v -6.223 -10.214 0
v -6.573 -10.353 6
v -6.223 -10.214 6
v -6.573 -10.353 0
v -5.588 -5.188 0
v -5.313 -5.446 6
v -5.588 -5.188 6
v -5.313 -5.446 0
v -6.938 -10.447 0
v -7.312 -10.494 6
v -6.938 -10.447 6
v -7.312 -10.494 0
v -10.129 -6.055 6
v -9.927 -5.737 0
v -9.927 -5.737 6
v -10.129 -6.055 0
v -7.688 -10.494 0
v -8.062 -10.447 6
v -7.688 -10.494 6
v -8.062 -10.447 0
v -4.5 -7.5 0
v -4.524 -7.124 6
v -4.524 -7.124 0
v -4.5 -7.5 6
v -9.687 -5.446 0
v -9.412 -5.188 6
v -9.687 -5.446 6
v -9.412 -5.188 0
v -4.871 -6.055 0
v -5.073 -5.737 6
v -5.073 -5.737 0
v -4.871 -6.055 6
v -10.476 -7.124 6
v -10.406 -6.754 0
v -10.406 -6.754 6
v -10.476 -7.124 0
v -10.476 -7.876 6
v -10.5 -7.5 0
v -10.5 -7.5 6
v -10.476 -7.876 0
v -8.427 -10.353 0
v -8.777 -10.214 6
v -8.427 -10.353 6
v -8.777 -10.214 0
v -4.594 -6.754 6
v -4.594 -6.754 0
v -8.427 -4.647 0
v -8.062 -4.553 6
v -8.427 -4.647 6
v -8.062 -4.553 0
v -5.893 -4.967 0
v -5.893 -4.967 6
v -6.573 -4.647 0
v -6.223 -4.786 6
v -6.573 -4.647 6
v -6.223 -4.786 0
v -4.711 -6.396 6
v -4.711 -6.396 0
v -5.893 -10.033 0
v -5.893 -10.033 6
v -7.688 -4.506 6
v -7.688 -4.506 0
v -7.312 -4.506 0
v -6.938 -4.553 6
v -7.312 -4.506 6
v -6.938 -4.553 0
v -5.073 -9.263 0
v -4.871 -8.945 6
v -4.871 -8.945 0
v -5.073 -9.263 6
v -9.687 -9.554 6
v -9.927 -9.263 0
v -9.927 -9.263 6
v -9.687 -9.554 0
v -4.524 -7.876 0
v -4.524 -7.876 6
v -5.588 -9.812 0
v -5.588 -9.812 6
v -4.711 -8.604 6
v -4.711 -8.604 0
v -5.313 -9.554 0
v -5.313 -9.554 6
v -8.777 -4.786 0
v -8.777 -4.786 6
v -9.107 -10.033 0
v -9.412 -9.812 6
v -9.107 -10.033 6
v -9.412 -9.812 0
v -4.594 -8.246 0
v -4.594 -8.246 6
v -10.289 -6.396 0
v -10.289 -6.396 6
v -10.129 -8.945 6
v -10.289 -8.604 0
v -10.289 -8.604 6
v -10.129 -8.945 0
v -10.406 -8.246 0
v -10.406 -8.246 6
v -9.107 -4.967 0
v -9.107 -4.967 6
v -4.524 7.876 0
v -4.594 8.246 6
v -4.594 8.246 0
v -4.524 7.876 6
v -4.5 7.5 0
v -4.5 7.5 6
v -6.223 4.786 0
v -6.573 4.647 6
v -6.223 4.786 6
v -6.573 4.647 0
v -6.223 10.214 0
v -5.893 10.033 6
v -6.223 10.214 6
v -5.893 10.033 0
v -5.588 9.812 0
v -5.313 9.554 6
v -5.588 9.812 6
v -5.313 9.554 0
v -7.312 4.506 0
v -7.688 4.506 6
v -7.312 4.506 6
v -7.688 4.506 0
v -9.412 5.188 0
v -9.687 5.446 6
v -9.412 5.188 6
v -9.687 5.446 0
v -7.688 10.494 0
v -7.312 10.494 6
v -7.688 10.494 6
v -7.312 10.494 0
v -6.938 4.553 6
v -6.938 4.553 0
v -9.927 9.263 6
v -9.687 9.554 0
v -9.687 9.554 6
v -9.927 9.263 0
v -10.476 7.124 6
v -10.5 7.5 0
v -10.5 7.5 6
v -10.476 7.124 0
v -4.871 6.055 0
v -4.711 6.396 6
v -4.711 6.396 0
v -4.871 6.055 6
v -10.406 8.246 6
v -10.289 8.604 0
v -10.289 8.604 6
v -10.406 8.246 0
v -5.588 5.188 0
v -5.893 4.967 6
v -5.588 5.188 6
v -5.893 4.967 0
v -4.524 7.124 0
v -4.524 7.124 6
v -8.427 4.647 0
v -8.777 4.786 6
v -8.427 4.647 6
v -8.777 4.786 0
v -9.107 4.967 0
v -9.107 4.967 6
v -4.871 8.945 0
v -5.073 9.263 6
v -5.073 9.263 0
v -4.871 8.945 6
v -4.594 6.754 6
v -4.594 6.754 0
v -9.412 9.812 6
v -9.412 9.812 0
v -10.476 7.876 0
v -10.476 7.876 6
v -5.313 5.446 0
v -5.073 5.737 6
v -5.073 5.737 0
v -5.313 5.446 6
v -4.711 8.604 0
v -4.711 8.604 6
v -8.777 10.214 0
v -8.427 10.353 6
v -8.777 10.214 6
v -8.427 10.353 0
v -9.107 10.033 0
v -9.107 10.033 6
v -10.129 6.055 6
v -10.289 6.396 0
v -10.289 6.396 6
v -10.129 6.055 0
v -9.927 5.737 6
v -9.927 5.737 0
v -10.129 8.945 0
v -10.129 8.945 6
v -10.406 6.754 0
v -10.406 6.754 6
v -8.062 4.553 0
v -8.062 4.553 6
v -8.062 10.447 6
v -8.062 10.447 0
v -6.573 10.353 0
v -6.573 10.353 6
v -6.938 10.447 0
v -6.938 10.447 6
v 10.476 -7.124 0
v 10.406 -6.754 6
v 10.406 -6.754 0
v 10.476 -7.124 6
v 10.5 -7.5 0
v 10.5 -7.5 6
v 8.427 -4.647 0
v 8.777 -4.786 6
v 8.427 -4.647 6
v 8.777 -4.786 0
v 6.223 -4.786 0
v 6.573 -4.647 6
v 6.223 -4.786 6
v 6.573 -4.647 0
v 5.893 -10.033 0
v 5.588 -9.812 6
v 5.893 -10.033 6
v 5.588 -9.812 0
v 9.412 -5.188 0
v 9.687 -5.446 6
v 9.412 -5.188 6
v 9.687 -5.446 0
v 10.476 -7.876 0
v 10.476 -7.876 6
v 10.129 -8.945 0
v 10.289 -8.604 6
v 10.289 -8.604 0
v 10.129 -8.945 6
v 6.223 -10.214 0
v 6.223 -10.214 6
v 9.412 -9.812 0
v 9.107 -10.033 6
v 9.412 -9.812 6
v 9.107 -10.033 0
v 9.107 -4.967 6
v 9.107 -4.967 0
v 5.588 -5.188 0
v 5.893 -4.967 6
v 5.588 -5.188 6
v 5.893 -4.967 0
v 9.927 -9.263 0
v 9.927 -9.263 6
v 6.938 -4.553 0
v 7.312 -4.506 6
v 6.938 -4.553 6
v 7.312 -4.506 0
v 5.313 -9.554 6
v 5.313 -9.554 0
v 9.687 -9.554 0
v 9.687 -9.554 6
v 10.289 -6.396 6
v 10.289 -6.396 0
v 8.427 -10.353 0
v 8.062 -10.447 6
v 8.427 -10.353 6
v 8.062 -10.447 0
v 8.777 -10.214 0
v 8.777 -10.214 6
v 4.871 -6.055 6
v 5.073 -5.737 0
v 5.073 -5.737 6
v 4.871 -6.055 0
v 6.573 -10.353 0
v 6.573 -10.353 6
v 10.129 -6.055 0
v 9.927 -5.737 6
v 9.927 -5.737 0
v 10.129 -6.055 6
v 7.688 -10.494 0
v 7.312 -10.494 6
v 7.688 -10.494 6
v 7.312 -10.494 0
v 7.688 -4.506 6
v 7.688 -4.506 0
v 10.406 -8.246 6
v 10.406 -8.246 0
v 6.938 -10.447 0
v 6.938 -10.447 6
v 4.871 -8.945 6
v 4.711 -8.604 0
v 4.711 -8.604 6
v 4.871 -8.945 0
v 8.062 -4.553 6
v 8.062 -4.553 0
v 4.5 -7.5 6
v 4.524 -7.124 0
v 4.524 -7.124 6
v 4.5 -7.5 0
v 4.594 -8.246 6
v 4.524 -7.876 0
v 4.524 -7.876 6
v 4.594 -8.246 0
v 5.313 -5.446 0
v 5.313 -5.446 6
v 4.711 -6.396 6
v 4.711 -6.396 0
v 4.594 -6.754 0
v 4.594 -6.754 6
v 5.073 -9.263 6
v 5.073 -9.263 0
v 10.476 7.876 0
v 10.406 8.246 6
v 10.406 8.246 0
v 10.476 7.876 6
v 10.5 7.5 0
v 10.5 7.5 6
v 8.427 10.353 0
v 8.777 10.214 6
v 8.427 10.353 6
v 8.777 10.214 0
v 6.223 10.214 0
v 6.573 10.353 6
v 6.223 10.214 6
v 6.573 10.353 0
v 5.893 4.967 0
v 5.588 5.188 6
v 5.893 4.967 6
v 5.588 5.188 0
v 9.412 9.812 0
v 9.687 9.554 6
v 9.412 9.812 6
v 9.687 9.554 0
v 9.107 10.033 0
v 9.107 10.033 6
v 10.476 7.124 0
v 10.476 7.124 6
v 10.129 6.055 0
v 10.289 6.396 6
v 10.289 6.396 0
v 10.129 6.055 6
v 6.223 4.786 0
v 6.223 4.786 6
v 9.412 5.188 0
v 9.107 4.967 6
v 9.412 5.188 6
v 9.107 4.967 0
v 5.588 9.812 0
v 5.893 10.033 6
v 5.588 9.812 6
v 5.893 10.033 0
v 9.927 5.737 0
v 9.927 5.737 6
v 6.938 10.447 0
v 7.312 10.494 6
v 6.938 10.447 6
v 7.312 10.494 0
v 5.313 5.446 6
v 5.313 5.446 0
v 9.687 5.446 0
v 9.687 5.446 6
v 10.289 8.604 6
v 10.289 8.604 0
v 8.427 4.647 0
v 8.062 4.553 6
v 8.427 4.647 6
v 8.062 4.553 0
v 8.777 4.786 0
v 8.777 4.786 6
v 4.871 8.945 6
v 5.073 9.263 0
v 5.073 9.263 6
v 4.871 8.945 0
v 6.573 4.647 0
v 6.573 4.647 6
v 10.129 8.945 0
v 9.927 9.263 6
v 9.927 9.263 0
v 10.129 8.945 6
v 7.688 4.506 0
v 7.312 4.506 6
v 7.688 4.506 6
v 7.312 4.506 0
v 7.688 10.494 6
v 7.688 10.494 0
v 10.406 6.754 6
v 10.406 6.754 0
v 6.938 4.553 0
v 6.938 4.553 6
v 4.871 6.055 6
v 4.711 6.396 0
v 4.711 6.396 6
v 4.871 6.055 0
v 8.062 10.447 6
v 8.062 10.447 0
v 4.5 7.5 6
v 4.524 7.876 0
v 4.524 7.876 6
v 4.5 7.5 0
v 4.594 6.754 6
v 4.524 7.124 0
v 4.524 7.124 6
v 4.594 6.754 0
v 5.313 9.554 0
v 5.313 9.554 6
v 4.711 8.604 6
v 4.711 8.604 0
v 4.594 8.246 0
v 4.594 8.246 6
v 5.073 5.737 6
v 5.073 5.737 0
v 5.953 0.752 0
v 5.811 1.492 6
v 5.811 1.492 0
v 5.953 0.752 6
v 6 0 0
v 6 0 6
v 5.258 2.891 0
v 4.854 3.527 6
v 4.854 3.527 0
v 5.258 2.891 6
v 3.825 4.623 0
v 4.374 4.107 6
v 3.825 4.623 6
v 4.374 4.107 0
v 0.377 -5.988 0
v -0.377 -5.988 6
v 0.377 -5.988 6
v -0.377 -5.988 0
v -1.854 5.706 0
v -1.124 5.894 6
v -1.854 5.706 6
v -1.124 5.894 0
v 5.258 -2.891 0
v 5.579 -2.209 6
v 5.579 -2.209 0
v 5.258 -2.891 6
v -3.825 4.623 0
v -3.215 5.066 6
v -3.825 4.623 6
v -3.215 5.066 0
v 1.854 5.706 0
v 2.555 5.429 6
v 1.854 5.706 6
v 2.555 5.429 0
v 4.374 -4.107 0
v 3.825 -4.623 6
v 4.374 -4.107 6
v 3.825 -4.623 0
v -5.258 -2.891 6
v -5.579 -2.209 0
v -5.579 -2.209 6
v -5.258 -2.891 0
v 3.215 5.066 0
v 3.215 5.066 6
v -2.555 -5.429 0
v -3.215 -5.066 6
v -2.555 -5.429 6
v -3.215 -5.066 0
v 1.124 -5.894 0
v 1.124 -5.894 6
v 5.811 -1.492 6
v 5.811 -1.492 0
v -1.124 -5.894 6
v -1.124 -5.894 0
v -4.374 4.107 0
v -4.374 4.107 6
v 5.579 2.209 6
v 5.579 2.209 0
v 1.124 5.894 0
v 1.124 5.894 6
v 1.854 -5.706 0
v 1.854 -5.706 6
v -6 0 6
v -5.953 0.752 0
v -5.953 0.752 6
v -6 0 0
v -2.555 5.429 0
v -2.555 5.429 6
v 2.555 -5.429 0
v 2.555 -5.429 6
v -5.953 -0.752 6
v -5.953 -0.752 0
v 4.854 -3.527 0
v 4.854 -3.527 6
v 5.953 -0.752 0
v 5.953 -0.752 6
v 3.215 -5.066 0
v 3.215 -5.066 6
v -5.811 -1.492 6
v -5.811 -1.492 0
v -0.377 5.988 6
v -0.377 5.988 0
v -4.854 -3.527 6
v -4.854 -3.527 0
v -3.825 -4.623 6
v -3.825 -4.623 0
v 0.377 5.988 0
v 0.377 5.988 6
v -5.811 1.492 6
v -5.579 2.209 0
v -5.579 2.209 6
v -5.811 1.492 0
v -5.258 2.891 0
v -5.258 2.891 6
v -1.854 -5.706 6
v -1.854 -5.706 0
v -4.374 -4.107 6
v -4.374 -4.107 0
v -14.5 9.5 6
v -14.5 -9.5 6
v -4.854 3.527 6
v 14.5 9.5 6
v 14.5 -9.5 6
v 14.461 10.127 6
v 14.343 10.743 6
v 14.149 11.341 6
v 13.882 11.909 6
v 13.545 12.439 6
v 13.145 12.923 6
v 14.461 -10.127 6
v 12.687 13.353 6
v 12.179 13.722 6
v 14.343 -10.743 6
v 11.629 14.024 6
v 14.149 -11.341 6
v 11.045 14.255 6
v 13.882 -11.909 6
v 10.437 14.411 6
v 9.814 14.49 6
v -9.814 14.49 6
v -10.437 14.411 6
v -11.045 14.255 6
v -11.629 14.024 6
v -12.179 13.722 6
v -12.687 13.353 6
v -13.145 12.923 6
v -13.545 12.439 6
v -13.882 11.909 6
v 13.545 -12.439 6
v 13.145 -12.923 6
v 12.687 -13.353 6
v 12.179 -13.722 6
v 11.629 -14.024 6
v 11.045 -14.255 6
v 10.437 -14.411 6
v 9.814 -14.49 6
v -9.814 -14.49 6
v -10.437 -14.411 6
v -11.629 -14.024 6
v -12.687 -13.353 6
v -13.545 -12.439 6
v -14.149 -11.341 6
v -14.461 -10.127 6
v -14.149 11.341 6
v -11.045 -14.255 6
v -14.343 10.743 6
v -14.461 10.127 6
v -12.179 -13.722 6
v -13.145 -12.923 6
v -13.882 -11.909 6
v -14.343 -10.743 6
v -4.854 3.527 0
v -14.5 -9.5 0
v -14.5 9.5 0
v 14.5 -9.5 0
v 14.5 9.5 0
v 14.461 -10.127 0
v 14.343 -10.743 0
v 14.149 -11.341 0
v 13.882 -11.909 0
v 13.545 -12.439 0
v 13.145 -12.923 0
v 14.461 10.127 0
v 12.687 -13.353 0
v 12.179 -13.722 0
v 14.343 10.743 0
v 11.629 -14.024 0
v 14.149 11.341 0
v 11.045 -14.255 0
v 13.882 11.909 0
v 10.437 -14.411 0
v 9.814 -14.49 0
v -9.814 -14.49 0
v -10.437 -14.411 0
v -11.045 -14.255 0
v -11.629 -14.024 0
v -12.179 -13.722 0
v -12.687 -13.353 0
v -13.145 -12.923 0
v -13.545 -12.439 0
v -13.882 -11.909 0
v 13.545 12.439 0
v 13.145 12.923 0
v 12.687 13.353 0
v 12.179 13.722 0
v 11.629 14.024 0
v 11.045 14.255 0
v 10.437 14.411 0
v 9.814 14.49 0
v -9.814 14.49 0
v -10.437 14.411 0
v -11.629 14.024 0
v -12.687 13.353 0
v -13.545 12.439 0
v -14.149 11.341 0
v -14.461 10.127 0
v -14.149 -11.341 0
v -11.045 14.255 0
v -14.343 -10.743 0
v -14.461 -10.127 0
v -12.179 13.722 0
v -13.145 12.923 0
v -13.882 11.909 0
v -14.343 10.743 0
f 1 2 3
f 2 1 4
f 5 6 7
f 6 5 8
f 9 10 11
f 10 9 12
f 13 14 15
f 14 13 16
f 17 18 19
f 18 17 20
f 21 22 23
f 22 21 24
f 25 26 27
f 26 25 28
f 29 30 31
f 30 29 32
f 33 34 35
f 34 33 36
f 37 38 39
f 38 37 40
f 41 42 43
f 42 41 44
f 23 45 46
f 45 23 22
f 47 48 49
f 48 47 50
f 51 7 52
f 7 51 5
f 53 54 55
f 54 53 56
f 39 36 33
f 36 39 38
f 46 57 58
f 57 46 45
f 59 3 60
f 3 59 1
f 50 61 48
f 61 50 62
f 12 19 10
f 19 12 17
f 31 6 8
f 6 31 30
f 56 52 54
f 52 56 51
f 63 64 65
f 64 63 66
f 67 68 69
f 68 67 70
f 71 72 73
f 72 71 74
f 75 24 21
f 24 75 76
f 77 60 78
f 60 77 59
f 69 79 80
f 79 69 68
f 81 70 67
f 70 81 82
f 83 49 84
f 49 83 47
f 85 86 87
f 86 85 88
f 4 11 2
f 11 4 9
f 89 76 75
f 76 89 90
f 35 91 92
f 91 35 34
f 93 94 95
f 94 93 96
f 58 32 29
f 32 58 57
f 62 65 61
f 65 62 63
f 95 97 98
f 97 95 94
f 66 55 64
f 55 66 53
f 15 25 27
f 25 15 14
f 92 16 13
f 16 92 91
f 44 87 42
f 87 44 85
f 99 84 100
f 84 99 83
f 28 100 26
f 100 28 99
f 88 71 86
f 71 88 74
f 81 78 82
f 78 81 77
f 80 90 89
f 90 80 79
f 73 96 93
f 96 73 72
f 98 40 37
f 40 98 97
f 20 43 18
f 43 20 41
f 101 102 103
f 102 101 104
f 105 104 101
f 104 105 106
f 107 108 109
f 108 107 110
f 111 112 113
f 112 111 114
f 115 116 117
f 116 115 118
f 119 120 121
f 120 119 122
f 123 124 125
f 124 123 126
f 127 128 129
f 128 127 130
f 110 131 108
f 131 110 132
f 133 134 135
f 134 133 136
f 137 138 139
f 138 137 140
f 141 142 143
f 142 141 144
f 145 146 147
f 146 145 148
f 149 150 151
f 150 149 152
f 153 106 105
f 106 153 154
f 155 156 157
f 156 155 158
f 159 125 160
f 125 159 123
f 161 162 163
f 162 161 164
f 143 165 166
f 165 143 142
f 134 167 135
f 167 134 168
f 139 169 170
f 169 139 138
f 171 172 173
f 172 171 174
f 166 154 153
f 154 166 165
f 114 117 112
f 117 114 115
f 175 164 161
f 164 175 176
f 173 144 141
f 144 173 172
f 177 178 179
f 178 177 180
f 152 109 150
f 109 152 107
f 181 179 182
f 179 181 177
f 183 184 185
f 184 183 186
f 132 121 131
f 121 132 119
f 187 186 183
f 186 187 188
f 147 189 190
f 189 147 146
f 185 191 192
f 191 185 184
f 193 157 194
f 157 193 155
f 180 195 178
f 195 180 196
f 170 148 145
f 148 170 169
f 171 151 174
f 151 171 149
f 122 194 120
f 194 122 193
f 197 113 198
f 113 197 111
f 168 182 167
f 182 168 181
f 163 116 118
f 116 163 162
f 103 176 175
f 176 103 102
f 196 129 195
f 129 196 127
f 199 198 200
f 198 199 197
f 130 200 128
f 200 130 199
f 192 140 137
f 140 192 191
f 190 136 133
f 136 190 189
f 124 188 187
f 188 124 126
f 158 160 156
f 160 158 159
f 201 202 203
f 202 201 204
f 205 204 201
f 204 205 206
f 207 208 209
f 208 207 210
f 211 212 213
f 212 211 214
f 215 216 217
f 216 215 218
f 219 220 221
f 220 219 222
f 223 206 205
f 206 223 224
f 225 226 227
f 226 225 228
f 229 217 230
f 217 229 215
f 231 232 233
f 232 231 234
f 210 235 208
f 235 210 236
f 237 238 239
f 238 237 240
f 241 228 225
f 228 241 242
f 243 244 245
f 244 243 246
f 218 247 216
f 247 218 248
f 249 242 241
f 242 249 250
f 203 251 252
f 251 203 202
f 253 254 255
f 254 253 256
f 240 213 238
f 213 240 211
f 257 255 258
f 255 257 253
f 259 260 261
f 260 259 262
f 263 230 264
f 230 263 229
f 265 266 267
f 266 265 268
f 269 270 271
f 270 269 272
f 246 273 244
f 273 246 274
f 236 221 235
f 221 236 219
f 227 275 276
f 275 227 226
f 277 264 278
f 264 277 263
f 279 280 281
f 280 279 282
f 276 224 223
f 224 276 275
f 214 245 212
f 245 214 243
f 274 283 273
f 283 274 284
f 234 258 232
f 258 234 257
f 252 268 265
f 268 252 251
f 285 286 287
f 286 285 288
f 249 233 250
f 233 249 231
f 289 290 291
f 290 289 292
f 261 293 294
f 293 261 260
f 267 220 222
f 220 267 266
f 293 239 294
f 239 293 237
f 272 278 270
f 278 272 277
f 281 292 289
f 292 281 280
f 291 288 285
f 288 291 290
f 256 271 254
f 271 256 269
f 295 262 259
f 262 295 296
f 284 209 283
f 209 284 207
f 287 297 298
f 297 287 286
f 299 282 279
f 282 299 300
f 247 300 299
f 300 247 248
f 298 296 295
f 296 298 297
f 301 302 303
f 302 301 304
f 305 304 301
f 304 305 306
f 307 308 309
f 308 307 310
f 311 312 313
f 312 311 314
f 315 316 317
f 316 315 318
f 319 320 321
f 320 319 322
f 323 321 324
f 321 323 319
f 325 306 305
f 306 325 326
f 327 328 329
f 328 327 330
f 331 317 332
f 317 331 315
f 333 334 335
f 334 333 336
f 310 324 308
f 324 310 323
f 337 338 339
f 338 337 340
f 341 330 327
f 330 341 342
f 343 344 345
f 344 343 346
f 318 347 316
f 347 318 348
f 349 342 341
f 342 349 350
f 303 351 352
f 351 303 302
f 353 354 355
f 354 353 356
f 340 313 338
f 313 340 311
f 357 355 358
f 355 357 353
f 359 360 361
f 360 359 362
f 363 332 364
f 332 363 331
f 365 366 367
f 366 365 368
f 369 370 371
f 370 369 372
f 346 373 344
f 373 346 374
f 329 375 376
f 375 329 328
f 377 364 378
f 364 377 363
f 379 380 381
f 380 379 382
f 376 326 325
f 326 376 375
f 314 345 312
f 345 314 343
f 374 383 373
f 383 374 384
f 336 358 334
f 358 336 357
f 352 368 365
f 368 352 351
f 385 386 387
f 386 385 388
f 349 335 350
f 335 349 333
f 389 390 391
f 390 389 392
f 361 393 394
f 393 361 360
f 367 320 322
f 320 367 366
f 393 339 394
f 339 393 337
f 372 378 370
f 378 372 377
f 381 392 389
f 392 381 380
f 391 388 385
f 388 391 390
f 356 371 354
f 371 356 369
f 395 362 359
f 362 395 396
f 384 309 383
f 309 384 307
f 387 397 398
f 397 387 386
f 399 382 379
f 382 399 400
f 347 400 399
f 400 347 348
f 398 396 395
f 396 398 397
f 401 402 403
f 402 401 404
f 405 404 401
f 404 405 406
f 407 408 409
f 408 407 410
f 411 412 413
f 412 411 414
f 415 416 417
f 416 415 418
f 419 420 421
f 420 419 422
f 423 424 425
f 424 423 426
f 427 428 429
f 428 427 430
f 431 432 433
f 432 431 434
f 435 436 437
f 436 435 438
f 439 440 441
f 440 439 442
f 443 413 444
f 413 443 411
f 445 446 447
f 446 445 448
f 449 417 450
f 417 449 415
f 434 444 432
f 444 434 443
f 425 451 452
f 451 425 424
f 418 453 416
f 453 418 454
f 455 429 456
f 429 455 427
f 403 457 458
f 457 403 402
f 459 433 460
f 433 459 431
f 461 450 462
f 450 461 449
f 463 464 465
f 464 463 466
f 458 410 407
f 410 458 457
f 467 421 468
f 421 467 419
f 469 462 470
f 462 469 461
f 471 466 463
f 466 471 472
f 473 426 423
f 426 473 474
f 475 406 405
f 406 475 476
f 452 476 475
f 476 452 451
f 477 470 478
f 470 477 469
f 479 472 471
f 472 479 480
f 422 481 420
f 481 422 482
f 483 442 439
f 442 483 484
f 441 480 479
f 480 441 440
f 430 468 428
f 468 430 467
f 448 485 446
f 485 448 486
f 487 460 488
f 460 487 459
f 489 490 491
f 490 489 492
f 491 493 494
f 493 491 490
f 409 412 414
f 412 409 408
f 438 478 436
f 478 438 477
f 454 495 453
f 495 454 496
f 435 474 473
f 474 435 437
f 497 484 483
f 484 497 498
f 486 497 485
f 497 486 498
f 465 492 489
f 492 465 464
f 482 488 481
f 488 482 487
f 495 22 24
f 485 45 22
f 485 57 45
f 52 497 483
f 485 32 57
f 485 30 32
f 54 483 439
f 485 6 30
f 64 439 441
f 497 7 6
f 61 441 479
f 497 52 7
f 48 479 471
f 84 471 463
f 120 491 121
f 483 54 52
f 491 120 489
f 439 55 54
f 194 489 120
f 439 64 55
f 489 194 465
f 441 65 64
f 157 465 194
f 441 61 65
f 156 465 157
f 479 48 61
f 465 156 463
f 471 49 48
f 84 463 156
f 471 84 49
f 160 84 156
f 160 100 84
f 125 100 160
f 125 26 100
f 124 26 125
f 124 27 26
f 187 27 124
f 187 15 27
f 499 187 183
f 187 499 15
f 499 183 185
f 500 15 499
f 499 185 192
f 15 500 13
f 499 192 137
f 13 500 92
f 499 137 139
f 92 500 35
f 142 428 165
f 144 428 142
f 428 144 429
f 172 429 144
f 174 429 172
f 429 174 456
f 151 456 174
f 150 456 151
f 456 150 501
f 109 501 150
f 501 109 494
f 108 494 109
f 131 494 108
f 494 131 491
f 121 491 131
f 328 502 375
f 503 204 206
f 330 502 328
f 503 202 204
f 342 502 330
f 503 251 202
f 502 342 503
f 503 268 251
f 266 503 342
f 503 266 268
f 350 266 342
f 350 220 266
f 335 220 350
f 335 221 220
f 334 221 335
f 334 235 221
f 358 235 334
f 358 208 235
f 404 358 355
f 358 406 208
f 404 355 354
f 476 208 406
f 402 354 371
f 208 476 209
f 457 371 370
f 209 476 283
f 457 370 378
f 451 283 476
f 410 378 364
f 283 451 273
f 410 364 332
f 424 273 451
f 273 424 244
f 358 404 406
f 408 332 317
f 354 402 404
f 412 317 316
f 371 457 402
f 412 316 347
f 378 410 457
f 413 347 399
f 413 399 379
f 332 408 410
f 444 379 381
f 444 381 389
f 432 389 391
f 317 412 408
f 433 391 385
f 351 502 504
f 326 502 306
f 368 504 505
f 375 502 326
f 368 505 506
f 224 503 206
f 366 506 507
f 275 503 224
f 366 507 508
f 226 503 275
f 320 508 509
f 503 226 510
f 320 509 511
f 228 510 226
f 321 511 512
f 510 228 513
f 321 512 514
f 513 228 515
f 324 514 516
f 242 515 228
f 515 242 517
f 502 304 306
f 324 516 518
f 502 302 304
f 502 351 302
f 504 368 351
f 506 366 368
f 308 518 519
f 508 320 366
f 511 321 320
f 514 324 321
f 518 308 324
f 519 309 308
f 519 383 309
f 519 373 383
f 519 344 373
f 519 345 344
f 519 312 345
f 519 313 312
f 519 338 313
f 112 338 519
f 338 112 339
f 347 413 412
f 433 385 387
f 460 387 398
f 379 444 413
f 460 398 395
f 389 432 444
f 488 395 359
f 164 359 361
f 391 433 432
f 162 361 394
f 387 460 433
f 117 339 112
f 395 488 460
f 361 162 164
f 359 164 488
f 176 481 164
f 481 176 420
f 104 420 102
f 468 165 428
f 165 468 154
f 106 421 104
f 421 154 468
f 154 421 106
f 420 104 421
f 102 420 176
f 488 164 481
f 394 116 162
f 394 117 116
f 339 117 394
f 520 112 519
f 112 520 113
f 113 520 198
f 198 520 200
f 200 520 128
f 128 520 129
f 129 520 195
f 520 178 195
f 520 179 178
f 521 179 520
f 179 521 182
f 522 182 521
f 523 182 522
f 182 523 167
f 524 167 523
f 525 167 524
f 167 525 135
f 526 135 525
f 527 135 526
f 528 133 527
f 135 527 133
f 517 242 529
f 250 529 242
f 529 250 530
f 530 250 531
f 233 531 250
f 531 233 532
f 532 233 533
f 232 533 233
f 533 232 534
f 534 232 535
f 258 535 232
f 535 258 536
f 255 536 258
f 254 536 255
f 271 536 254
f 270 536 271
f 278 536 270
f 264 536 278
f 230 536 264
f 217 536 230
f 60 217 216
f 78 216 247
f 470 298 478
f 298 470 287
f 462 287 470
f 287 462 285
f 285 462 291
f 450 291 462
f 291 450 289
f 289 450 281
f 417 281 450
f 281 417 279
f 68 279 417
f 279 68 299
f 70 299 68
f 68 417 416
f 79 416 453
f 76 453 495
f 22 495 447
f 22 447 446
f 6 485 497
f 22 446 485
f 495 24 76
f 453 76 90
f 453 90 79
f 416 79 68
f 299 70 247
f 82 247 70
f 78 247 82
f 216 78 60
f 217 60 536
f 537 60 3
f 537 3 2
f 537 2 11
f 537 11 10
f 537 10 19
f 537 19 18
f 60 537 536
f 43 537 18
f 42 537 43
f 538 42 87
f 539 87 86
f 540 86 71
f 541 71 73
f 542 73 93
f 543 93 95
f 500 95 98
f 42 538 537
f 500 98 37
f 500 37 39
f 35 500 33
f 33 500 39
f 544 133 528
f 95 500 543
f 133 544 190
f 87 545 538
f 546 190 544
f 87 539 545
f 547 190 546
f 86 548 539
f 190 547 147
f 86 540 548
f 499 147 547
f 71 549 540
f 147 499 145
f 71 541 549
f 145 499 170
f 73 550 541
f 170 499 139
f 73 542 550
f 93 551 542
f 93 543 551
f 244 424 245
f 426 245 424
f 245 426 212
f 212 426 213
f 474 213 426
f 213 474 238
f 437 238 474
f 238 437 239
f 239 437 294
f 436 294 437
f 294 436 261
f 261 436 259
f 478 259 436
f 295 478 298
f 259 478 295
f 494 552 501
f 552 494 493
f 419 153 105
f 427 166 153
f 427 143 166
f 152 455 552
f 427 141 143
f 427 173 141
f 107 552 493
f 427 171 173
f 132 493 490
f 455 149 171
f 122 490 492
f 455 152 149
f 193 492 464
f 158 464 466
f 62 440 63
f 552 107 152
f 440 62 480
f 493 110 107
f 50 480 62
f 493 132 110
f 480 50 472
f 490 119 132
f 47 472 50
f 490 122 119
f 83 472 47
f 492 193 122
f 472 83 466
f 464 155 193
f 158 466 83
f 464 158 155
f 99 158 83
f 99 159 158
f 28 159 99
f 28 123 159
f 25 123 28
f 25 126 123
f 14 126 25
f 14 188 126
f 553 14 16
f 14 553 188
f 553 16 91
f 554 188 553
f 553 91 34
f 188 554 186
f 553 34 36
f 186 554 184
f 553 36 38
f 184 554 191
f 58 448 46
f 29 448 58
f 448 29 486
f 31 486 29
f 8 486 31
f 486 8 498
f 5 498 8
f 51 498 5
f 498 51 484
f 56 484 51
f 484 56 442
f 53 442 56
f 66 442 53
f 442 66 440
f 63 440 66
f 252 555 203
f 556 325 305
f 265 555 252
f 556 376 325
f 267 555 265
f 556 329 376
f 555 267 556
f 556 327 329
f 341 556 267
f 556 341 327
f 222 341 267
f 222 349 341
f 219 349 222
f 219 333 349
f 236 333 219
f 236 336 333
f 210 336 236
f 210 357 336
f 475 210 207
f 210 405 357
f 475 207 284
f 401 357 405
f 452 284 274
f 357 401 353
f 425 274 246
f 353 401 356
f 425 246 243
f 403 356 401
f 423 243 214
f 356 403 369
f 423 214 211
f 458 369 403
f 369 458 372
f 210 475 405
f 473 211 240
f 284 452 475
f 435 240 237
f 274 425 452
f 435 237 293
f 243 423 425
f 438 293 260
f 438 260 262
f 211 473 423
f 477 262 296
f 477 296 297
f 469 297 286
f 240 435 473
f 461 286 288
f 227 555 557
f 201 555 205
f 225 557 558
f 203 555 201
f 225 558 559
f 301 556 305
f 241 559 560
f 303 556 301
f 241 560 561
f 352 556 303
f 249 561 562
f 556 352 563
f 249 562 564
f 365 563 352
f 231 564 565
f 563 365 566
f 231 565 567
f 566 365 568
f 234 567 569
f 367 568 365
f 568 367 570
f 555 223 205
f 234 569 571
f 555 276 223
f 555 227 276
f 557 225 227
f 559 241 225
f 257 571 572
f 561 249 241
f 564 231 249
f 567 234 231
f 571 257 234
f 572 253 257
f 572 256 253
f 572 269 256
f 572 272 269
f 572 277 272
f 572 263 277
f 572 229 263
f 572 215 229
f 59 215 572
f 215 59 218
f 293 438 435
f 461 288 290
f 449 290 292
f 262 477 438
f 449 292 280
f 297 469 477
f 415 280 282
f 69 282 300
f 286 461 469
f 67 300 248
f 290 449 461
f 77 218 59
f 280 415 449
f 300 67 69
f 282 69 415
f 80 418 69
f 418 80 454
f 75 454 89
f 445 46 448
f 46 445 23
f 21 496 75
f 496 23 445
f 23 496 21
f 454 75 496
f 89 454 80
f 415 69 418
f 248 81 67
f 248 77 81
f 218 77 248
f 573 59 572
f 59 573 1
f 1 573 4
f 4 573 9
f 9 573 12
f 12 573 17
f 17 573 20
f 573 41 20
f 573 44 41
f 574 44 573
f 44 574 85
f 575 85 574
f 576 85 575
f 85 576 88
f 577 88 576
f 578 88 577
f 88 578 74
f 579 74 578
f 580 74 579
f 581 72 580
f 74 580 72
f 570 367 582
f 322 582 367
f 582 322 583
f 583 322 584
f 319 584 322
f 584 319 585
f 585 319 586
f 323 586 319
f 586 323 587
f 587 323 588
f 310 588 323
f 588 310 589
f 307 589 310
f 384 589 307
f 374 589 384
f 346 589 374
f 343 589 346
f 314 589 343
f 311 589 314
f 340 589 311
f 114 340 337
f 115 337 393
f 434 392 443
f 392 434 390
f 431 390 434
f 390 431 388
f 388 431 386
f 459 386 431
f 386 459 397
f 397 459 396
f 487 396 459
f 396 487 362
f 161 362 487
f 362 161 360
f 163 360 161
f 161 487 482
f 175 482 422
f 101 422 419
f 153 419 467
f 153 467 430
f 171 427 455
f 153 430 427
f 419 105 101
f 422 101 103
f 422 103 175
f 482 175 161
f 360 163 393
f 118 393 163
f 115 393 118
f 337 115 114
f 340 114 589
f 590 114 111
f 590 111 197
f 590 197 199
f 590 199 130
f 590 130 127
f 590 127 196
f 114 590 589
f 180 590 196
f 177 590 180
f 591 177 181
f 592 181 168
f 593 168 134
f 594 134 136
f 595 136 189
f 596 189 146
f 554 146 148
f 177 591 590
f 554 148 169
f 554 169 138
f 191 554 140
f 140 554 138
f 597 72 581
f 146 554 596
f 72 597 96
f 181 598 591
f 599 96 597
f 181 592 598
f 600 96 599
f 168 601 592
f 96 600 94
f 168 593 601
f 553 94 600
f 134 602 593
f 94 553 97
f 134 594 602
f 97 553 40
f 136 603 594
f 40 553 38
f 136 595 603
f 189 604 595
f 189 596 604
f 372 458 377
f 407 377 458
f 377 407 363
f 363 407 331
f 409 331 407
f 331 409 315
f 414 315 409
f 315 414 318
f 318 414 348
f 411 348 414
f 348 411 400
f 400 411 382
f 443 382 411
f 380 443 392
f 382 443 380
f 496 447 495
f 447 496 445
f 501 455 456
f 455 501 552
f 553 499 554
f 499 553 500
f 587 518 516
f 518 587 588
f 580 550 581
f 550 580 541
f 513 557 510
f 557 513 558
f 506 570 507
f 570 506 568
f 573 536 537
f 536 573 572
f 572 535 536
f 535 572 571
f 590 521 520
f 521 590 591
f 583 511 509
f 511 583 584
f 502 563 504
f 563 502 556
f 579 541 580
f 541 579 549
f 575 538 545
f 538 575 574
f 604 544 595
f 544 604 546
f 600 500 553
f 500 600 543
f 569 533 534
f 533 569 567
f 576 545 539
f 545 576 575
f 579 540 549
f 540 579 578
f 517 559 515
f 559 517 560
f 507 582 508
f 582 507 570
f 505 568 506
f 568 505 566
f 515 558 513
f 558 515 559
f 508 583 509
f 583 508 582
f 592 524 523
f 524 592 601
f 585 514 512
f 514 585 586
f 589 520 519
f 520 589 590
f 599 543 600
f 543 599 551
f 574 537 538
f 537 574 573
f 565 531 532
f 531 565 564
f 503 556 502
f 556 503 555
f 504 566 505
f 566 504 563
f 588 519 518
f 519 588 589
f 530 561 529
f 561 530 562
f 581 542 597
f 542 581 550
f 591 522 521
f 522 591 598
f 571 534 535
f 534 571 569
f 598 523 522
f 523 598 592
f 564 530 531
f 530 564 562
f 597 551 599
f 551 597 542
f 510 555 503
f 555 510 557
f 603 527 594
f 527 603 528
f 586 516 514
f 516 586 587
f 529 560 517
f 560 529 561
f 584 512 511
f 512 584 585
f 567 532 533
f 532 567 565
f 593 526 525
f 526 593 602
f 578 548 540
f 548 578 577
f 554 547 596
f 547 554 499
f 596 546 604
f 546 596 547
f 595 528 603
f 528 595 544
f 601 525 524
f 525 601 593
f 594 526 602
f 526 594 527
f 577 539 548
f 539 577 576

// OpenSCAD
$fn = 50;


difference() {
	union() {
		hull() {
			translate(v = [-9.5000000000, 9.5000000000, 0]) {
				cylinder(h = 6, r = 5);
			}
			translate(v = [9.5000000000, 9.5000000000, 0]) {
				cylinder(h = 6, r = 5);
			}
			translate(v = [-9.5000000000, -9.5000000000, 0]) {
				cylinder(h = 6, r = 5);
			}
			translate(v = [9.5000000000, -9.5000000000, 0]) {
				cylinder(h = 6, r = 5);
			}
		}
	}
	union() {
		#translate(v = [-7.5000000000, -7.5000000000, -100.0000000000]) {
			cylinder(h = 200, r = 3.0000000000);
		}
		#translate(v = [-7.5000000000, 7.5000000000, -100.0000000000]) {
			cylinder(h = 200, r = 3.0000000000);
		}
		#translate(v = [7.5000000000, -7.5000000000, -100.0000000000]) {
			cylinder(h = 200, r = 3.0000000000);
		}
		#translate(v = [7.5000000000, 7.5000000000, -100.0000000000]) {
			cylinder(h = 200, r = 3.0000000000);
		}
		#cylinder(h = 6, r = 6.0000000000);
	}
}
